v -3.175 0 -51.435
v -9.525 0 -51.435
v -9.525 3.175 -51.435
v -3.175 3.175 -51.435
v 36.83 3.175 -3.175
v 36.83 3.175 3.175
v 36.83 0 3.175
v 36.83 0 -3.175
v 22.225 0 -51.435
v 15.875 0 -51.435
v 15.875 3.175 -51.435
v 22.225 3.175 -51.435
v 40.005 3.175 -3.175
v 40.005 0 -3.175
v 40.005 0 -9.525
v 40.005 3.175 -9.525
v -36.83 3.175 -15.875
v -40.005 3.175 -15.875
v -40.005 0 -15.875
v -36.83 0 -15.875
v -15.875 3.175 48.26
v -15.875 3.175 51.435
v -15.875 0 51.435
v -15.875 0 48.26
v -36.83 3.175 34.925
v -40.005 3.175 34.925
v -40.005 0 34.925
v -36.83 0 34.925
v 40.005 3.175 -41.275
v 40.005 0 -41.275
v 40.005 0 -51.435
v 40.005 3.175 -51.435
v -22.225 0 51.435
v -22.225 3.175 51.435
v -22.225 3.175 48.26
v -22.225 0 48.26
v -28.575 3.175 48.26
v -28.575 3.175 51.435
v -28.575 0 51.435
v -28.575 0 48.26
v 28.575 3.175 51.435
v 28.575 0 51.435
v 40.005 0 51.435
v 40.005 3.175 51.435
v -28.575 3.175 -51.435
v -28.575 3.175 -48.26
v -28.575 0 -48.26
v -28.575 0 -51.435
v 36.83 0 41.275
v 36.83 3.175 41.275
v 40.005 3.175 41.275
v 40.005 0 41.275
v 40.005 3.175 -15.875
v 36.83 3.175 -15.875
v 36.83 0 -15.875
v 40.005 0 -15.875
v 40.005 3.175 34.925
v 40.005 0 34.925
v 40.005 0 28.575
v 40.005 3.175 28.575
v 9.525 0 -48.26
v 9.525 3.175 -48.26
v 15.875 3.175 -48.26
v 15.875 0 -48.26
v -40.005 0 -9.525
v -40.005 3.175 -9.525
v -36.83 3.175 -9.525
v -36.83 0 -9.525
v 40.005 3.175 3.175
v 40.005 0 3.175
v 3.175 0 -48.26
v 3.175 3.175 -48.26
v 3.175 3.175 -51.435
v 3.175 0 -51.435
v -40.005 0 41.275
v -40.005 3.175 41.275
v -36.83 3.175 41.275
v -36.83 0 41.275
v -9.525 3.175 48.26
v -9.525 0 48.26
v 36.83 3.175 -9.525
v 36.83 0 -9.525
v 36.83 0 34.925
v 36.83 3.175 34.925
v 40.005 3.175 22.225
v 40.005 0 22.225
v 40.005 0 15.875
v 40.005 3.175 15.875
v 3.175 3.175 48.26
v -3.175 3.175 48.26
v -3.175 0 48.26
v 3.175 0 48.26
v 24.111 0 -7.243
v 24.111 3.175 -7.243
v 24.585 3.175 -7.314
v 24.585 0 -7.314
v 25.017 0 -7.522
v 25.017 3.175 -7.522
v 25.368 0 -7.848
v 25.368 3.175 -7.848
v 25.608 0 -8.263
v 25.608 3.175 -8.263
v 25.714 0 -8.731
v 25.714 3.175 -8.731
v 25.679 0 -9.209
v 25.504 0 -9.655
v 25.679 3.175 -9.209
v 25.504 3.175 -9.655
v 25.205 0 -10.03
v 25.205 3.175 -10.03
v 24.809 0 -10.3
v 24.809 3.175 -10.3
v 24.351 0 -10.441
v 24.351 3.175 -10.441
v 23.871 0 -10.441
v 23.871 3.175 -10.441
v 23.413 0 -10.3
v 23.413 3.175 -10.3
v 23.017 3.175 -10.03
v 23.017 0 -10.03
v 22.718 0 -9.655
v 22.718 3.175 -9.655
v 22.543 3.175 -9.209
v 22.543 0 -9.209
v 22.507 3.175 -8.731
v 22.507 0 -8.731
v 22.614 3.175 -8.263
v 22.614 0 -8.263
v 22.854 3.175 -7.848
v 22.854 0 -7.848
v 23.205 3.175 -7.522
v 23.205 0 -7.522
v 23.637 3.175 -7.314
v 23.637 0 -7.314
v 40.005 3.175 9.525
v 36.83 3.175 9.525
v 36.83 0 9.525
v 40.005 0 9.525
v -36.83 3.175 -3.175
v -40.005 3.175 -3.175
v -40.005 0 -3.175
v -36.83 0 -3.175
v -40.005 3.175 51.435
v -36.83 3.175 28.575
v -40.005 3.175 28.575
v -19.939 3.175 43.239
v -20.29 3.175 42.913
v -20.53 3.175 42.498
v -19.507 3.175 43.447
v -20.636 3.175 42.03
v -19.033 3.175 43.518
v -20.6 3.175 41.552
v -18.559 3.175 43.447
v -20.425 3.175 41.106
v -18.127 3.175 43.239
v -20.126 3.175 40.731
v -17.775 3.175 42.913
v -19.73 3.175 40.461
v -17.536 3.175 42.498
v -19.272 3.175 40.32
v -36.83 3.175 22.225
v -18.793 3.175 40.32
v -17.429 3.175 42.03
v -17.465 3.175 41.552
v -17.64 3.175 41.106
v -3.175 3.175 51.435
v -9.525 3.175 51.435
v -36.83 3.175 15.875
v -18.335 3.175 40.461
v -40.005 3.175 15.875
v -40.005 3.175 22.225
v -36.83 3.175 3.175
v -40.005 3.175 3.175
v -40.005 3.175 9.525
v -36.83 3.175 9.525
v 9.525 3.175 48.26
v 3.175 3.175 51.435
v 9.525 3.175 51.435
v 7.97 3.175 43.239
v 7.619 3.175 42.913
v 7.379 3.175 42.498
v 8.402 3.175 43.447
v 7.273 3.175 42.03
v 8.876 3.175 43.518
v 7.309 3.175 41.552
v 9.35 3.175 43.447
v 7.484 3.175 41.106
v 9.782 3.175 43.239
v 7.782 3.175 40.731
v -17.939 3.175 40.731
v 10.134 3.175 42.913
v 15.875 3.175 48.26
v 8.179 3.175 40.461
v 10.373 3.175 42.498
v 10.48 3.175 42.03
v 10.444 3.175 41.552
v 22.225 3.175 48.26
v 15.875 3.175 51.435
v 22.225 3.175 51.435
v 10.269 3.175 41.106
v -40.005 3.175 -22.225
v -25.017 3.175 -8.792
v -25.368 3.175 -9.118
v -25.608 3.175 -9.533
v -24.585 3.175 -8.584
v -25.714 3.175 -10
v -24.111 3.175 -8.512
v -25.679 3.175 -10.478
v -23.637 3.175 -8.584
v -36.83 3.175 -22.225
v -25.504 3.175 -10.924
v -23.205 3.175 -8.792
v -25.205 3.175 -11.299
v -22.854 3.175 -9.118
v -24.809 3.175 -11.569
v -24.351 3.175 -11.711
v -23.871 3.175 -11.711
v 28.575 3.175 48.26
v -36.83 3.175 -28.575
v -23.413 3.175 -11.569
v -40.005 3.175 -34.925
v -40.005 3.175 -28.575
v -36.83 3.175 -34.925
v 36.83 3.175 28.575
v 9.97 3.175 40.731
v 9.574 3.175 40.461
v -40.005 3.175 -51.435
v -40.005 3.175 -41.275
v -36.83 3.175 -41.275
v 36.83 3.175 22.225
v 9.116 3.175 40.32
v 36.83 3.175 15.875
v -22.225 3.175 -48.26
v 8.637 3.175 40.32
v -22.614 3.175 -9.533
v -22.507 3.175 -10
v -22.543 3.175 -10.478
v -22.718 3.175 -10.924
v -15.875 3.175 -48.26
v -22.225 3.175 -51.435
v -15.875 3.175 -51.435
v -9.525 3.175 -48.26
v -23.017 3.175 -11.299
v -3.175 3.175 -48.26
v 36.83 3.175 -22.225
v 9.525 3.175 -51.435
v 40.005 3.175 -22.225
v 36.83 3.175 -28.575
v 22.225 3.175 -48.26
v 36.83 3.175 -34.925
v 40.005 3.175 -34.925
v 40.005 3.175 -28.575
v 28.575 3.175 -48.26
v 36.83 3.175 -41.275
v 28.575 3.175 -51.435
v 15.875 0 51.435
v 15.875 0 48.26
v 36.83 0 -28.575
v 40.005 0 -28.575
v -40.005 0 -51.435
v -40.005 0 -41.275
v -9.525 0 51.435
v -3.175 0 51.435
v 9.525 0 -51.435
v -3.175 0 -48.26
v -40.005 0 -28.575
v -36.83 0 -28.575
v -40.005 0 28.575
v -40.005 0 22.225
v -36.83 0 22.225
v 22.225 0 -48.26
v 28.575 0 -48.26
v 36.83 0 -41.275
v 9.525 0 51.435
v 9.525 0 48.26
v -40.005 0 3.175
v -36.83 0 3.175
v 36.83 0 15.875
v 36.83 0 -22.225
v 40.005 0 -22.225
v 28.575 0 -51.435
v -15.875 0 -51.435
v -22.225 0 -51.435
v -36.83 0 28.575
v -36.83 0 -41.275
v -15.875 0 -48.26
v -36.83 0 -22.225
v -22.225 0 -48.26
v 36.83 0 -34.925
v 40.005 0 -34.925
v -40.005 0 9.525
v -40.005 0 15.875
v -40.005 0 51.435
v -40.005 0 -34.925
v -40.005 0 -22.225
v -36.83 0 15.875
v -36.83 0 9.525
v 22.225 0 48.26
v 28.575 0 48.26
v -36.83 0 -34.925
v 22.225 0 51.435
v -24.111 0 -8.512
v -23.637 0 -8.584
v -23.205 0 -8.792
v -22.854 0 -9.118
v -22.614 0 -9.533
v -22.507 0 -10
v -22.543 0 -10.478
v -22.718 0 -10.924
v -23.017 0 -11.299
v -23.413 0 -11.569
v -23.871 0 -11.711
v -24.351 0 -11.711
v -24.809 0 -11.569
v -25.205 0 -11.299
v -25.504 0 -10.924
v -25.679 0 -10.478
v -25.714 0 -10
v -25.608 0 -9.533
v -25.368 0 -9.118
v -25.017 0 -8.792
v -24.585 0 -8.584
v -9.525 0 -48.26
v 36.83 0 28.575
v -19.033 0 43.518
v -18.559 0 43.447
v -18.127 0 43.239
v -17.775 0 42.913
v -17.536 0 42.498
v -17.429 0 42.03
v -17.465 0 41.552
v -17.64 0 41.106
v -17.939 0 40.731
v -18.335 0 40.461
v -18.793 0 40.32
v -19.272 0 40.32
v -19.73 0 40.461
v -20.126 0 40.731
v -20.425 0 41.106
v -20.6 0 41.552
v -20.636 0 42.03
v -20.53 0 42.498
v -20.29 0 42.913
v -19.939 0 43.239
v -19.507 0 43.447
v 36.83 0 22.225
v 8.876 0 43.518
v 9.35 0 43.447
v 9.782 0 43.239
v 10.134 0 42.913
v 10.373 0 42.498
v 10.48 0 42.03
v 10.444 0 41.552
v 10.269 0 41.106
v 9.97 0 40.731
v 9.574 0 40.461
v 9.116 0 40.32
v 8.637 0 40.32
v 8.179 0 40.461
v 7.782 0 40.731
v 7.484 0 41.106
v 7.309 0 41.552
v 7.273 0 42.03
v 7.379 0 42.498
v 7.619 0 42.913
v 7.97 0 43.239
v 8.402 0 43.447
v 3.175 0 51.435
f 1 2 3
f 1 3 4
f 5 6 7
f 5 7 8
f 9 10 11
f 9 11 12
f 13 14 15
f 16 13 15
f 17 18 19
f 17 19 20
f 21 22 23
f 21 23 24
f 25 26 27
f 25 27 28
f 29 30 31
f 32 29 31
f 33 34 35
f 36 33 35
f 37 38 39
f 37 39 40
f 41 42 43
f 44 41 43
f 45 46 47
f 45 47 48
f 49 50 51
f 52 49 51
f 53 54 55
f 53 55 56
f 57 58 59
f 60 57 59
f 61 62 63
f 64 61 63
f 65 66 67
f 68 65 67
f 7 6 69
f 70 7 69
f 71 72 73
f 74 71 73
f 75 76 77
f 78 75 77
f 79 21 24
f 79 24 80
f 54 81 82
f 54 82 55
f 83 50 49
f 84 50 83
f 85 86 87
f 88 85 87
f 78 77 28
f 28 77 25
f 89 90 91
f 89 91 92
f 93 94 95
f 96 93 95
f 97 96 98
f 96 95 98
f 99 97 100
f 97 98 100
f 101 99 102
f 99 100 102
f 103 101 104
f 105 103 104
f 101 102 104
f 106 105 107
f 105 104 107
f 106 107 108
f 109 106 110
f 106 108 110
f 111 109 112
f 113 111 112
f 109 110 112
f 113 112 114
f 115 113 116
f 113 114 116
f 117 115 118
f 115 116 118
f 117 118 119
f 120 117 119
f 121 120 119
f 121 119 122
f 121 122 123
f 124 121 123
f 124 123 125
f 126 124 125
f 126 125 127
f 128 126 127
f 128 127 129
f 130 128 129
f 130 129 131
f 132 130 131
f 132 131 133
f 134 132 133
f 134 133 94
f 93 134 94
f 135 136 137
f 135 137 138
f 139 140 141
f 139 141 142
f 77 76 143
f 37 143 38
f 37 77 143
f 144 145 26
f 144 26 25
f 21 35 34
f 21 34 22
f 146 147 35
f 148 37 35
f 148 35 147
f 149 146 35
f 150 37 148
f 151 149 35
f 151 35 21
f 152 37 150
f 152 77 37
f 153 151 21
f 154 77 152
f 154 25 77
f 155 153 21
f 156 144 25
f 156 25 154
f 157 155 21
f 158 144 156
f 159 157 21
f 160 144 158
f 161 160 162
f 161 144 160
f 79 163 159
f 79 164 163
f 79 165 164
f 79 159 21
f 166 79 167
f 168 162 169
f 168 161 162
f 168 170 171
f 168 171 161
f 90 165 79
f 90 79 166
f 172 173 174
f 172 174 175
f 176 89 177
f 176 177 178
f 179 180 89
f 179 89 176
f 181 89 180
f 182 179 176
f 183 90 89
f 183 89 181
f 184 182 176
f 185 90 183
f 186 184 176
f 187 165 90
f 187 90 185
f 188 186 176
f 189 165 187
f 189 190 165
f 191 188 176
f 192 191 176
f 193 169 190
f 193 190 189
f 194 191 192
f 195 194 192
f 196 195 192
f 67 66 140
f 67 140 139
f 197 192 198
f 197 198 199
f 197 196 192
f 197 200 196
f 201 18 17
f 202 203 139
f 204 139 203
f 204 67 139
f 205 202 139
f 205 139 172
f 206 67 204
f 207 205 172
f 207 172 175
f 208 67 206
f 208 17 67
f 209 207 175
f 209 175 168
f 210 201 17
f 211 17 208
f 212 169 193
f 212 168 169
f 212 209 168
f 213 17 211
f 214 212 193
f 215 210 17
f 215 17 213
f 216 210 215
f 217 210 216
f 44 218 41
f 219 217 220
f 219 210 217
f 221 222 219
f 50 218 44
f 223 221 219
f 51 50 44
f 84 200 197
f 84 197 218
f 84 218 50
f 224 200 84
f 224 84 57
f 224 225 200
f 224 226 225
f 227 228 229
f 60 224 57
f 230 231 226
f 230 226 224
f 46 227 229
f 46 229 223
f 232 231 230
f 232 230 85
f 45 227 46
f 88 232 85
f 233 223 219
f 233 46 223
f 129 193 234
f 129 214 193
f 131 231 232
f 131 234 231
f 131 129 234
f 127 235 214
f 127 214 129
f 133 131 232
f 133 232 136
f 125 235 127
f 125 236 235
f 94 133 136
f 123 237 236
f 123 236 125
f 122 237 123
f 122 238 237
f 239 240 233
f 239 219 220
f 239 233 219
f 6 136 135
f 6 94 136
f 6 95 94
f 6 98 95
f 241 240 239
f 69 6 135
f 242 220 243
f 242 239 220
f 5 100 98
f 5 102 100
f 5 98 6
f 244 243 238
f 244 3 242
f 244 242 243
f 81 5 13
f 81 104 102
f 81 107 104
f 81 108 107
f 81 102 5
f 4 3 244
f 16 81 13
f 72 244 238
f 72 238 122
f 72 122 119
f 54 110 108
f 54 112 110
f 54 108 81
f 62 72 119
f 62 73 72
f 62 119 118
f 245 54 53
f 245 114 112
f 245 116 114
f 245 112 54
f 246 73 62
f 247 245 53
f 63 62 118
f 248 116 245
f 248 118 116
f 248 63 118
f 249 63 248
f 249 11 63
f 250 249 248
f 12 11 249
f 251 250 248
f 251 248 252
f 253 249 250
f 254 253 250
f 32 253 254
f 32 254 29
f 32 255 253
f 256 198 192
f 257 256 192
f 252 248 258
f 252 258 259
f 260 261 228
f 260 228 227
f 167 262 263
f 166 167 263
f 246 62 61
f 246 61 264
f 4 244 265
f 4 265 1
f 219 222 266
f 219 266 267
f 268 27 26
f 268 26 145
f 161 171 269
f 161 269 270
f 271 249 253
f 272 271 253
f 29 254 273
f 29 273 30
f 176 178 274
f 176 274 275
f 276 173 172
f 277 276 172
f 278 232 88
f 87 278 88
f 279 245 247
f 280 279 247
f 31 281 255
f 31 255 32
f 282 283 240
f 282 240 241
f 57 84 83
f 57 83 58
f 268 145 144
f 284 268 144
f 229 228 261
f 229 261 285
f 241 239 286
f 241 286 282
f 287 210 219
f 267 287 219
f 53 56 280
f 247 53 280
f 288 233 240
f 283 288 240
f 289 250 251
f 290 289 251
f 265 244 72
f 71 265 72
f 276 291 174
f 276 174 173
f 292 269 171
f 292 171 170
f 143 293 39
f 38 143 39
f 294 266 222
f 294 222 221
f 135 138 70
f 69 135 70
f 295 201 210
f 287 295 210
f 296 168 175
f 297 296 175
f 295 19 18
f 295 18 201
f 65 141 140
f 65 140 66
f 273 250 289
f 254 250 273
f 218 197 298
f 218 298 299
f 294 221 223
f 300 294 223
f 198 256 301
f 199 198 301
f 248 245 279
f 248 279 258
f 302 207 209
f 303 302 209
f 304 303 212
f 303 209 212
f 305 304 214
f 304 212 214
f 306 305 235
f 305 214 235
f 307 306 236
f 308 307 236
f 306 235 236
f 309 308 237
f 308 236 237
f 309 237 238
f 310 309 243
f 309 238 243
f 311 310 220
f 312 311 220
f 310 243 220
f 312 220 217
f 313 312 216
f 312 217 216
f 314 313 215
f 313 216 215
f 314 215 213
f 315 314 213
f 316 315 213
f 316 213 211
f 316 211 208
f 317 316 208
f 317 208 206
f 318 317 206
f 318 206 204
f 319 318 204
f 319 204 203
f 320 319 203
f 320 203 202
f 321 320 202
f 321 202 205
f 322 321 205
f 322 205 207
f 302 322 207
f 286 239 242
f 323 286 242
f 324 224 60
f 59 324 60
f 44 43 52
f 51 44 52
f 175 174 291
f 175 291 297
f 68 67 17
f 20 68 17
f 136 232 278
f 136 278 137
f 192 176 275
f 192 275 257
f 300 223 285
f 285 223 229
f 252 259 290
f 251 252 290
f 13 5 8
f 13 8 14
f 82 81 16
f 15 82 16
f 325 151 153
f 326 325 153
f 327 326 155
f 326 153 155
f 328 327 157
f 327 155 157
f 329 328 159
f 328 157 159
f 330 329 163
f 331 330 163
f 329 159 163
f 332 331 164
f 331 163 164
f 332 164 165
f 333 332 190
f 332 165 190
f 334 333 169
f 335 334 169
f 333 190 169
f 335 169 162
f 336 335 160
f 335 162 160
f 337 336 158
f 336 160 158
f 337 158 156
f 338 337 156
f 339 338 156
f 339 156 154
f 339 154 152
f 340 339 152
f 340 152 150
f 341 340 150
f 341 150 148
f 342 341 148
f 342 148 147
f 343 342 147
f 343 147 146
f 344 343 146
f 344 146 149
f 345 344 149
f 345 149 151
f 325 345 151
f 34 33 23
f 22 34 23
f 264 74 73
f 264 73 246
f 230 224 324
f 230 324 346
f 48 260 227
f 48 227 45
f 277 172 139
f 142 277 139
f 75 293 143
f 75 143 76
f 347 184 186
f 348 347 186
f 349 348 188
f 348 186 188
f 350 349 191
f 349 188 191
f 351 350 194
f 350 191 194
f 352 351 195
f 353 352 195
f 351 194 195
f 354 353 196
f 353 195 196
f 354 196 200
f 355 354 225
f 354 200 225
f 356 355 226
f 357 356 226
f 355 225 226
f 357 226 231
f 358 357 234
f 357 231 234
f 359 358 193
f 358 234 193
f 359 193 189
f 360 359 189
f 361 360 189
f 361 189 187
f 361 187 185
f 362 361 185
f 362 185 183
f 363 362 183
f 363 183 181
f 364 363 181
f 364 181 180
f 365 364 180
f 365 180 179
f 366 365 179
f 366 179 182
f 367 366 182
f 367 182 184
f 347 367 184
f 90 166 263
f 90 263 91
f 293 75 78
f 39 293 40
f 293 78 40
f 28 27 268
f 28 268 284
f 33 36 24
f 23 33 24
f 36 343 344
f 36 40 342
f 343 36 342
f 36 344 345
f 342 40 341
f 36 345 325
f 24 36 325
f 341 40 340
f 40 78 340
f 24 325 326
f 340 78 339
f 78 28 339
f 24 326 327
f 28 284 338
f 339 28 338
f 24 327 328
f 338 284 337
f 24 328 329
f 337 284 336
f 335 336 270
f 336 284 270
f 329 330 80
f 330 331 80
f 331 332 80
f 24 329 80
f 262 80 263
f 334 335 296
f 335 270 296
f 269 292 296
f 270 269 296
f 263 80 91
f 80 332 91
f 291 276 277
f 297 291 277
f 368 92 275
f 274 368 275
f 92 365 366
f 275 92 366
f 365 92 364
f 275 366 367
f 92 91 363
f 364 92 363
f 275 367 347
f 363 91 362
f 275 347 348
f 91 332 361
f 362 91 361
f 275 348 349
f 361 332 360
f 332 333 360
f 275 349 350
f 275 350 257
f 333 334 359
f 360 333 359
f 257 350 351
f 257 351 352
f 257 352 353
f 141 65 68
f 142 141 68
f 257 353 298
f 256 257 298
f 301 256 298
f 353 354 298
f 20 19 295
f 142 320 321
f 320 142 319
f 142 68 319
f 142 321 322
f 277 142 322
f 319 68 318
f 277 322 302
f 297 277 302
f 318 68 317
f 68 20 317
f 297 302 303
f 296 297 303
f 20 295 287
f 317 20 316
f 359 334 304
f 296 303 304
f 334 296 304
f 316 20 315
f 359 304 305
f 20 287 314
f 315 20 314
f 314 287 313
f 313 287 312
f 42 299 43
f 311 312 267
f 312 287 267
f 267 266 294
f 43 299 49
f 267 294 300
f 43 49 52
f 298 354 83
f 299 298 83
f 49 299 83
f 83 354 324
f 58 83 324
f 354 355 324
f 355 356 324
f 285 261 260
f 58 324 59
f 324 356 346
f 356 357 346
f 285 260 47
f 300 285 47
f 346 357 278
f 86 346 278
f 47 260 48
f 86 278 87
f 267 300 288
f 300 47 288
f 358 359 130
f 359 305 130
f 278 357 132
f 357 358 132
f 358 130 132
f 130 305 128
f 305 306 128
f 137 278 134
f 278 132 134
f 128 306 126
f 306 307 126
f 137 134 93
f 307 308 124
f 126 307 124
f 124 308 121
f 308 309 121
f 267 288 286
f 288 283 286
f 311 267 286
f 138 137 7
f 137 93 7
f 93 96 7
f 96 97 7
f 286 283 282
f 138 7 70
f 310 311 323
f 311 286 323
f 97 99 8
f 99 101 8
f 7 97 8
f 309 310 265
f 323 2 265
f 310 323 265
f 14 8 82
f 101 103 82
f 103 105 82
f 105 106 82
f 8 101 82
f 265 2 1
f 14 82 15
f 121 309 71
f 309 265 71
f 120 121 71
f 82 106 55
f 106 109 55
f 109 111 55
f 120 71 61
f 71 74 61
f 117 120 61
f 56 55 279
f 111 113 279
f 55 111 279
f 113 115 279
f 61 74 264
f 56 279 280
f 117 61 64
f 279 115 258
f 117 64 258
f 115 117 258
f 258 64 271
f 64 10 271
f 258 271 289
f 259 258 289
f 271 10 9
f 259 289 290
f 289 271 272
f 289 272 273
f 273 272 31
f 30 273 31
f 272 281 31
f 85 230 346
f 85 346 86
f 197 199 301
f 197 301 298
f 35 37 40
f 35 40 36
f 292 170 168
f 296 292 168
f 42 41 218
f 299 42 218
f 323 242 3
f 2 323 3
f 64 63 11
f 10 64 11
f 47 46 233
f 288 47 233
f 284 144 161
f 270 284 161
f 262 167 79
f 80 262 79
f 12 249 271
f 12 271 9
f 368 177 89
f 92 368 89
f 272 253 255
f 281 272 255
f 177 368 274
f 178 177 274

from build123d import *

# Parameters (mm, degrees)
SKETCH1_W           = 80.01
SKETCH1_H           = 102.87
BOSS_EXTRUDE1_DEPTH = 3.175
SKETCH2_W           = 3.175
SKETCH2_H           = 6.35
CUT_EXTRUDE1_DEPTH  = 4.175
SKETCH3_W           = 6.35
SKETCH3_H           = 3.175
CUT_EXTRUDE2_DEPTH  = 4.175
SKETCH8_R           = 1.60809856
SKETCH8_R_2         = 1.608098511
SKETCH8_R_3         = 1.608098562
CUT_EXTRUDE3_DEPTH  = 4.175


with BuildPart() as part:
    # Sketch1 → Boss-Extrude1 (new body)
    with BuildSketch(Plane(origin=(0, 0, 0), x_dir=(1, 0, 0), z_dir=(0, 1, 0))):
        Rectangle(SKETCH1_W, SKETCH1_H)
    extrude(amount=BOSS_EXTRUDE1_DEPTH)

    # Sketch2 → Cut-Extrude1 (cut, through all)
    with BuildSketch(Plane(origin=(0, 3.175, 0), x_dir=(1, 0, 0), z_dir=(0, 1, 0))):
        with Locations((-38.4175, -38.1)):
            Rectangle(SKETCH2_W, SKETCH2_H)
        with Locations((-38.4175, -25.4)):
            Rectangle(SKETCH2_W, SKETCH2_H)
        with Locations((-38.4175, -12.7)):
            Rectangle(SKETCH2_W, SKETCH2_H)
        with Locations((-38.4175, 0)):
            Rectangle(SKETCH2_W, SKETCH2_H)
        with Locations((-38.4175, 12.7)):
            Rectangle(SKETCH2_W, SKETCH2_H)
        with Locations((-38.4175, 25.4)):
            Rectangle(SKETCH2_W, SKETCH2_H)
        with Locations((38.4175, 25.4)):
            Rectangle(SKETCH2_W, SKETCH2_H)
        with Locations((38.4175, 12.7)):
            Rectangle(SKETCH2_W, SKETCH2_H)
        with Locations((38.4175, 0)):
            Rectangle(SKETCH2_W, SKETCH2_H)
        with Locations((38.4175, -12.7)):
            Rectangle(SKETCH2_W, SKETCH2_H)
        with Locations((38.4175, -25.4)):
            Rectangle(SKETCH2_W, SKETCH2_H)
        with Locations((38.4175, -38.1)):
            Rectangle(SKETCH2_W, SKETCH2_H)
        with Locations((-38.4175, 38.1)):
            Rectangle(SKETCH2_W, SKETCH2_H)
        with Locations((38.4175, 38.1)):
            Rectangle(SKETCH2_W, SKETCH2_H)
    extrude(amount=-CUT_EXTRUDE1_DEPTH, mode=Mode.SUBTRACT)

    # Sketch3 → Cut-Extrude2 (cut, through all)
    with BuildSketch(Plane(origin=(0, 3.175, 0), x_dir=(1, 0, 0), z_dir=(0, 1, 0))):
        with Locations((25.4, 49.8475)):
            Rectangle(SKETCH3_W, SKETCH3_H)
        with Locations((12.7, 49.8475)):
            Rectangle(SKETCH3_W, SKETCH3_H)
        with Locations((0, 49.8475)):
            Rectangle(SKETCH3_W, SKETCH3_H)
        with Locations((-12.7, 49.8475)):
            Rectangle(SKETCH3_W, SKETCH3_H)
        with Locations((-12.7, -49.8475)):
            Rectangle(SKETCH3_W, SKETCH3_H)
        with Locations((0, -49.8475)):
            Rectangle(SKETCH3_W, SKETCH3_H)
        with Locations((12.7, -49.8475)):
            Rectangle(SKETCH3_W, SKETCH3_H)
        with Locations((25.4, -49.8475)):
            Rectangle(SKETCH3_W, SKETCH3_H)
        with Locations((-25.4, -49.8475)):
            Rectangle(SKETCH3_W, SKETCH3_H)
        with Locations((-25.4, 49.8475)):
            Rectangle(SKETCH3_W, SKETCH3_H)
    extrude(amount=-CUT_EXTRUDE2_DEPTH, mode=Mode.SUBTRACT)

    # Sketch8 → Cut-Extrude3 (cut, through all)
    with BuildSketch(Plane(origin=(-2.403797872, 3.175, 1.855162727), x_dir=(0, 0, 1), z_dir=(0, 1, 0))):
        with Locations((-10.706059909, 26.514695053)):
            Circle(SKETCH8_R)
        with Locations((-11.975611322, -21.707099309)):
            Circle(SKETCH8_R_2)
        with Locations((40.054837273, -16.628893673)):
            Circle(SKETCH8_R_3)
        with Locations((40.054837273, 11.280078142)):
            Circle(SKETCH8_R)
    extrude(amount=-CUT_EXTRUDE3_DEPTH, mode=Mode.SUBTRACT)


solid = part.part
